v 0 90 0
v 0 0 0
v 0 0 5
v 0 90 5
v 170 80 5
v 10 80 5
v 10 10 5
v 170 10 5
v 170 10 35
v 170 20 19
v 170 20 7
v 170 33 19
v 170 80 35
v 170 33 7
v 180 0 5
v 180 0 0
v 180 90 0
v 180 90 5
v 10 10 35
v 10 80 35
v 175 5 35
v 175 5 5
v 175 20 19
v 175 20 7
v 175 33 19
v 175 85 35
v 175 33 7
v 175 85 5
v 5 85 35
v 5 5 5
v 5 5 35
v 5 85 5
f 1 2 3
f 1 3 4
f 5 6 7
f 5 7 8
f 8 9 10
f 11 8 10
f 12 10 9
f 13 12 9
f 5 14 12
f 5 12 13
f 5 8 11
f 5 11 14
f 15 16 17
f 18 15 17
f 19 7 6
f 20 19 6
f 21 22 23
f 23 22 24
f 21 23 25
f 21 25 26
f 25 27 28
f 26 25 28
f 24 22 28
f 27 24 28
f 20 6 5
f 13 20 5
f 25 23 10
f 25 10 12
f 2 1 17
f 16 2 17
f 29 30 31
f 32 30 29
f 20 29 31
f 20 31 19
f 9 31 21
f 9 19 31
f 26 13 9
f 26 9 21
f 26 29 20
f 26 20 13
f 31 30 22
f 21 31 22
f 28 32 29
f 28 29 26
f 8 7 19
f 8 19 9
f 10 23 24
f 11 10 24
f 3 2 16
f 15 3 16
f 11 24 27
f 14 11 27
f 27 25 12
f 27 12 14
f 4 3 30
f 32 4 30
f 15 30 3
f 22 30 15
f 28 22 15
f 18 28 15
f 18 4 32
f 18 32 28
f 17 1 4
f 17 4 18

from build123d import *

# Parameters (mm, degrees)
ESQUISSE2_W             = 180
ESQUISSE2_H             = 90
BOSS_EXTRU_2_DEPTH      = 5
ESQUISSE3_W             = 170
ESQUISSE3_H             = 80
ESQUISSE3_W_2           = 160
ESQUISSE3_H_2           = 70
BOSS_EXTRU_3_DEPTH      = 30
ESQUISSE4_W             = 12
ESQUISSE4_H             = 13
ENL_V_MAT_EXTRU_1_DEPTH = 5


with BuildPart() as part:
    # Esquisse2 → Boss.-Extru.2 (new body)
    with BuildSketch(Plane.XY):
        with Locations((90, 45)):
            Rectangle(ESQUISSE2_W, ESQUISSE2_H)
    extrude(amount=BOSS_EXTRU_2_DEPTH)

    # Esquisse3 → Boss.-Extru.3 (add)
    with BuildSketch(Plane.XY.offset(5)):
        with Locations((90, 45)):
            Rectangle(ESQUISSE3_W, ESQUISSE3_H)
        with Locations((90, 45)):
            Rectangle(ESQUISSE3_W_2, ESQUISSE3_H_2, mode=Mode.SUBTRACT)
    extrude(amount=BOSS_EXTRU_3_DEPTH)

    # Esquisse4 → Enlèv. mat.-Extru.1 (cut)
    with BuildSketch(Plane(origin=(175, 0, 0), x_dir=(0, 0, -1), z_dir=(1, 0, 0))):
        with Locations((-13, 26.5)):
            Rectangle(ESQUISSE4_W, ESQUISSE4_H)
    extrude(amount=-ENL_V_MAT_EXTRU_1_DEPTH, mode=Mode.SUBTRACT)


solid = part.part
